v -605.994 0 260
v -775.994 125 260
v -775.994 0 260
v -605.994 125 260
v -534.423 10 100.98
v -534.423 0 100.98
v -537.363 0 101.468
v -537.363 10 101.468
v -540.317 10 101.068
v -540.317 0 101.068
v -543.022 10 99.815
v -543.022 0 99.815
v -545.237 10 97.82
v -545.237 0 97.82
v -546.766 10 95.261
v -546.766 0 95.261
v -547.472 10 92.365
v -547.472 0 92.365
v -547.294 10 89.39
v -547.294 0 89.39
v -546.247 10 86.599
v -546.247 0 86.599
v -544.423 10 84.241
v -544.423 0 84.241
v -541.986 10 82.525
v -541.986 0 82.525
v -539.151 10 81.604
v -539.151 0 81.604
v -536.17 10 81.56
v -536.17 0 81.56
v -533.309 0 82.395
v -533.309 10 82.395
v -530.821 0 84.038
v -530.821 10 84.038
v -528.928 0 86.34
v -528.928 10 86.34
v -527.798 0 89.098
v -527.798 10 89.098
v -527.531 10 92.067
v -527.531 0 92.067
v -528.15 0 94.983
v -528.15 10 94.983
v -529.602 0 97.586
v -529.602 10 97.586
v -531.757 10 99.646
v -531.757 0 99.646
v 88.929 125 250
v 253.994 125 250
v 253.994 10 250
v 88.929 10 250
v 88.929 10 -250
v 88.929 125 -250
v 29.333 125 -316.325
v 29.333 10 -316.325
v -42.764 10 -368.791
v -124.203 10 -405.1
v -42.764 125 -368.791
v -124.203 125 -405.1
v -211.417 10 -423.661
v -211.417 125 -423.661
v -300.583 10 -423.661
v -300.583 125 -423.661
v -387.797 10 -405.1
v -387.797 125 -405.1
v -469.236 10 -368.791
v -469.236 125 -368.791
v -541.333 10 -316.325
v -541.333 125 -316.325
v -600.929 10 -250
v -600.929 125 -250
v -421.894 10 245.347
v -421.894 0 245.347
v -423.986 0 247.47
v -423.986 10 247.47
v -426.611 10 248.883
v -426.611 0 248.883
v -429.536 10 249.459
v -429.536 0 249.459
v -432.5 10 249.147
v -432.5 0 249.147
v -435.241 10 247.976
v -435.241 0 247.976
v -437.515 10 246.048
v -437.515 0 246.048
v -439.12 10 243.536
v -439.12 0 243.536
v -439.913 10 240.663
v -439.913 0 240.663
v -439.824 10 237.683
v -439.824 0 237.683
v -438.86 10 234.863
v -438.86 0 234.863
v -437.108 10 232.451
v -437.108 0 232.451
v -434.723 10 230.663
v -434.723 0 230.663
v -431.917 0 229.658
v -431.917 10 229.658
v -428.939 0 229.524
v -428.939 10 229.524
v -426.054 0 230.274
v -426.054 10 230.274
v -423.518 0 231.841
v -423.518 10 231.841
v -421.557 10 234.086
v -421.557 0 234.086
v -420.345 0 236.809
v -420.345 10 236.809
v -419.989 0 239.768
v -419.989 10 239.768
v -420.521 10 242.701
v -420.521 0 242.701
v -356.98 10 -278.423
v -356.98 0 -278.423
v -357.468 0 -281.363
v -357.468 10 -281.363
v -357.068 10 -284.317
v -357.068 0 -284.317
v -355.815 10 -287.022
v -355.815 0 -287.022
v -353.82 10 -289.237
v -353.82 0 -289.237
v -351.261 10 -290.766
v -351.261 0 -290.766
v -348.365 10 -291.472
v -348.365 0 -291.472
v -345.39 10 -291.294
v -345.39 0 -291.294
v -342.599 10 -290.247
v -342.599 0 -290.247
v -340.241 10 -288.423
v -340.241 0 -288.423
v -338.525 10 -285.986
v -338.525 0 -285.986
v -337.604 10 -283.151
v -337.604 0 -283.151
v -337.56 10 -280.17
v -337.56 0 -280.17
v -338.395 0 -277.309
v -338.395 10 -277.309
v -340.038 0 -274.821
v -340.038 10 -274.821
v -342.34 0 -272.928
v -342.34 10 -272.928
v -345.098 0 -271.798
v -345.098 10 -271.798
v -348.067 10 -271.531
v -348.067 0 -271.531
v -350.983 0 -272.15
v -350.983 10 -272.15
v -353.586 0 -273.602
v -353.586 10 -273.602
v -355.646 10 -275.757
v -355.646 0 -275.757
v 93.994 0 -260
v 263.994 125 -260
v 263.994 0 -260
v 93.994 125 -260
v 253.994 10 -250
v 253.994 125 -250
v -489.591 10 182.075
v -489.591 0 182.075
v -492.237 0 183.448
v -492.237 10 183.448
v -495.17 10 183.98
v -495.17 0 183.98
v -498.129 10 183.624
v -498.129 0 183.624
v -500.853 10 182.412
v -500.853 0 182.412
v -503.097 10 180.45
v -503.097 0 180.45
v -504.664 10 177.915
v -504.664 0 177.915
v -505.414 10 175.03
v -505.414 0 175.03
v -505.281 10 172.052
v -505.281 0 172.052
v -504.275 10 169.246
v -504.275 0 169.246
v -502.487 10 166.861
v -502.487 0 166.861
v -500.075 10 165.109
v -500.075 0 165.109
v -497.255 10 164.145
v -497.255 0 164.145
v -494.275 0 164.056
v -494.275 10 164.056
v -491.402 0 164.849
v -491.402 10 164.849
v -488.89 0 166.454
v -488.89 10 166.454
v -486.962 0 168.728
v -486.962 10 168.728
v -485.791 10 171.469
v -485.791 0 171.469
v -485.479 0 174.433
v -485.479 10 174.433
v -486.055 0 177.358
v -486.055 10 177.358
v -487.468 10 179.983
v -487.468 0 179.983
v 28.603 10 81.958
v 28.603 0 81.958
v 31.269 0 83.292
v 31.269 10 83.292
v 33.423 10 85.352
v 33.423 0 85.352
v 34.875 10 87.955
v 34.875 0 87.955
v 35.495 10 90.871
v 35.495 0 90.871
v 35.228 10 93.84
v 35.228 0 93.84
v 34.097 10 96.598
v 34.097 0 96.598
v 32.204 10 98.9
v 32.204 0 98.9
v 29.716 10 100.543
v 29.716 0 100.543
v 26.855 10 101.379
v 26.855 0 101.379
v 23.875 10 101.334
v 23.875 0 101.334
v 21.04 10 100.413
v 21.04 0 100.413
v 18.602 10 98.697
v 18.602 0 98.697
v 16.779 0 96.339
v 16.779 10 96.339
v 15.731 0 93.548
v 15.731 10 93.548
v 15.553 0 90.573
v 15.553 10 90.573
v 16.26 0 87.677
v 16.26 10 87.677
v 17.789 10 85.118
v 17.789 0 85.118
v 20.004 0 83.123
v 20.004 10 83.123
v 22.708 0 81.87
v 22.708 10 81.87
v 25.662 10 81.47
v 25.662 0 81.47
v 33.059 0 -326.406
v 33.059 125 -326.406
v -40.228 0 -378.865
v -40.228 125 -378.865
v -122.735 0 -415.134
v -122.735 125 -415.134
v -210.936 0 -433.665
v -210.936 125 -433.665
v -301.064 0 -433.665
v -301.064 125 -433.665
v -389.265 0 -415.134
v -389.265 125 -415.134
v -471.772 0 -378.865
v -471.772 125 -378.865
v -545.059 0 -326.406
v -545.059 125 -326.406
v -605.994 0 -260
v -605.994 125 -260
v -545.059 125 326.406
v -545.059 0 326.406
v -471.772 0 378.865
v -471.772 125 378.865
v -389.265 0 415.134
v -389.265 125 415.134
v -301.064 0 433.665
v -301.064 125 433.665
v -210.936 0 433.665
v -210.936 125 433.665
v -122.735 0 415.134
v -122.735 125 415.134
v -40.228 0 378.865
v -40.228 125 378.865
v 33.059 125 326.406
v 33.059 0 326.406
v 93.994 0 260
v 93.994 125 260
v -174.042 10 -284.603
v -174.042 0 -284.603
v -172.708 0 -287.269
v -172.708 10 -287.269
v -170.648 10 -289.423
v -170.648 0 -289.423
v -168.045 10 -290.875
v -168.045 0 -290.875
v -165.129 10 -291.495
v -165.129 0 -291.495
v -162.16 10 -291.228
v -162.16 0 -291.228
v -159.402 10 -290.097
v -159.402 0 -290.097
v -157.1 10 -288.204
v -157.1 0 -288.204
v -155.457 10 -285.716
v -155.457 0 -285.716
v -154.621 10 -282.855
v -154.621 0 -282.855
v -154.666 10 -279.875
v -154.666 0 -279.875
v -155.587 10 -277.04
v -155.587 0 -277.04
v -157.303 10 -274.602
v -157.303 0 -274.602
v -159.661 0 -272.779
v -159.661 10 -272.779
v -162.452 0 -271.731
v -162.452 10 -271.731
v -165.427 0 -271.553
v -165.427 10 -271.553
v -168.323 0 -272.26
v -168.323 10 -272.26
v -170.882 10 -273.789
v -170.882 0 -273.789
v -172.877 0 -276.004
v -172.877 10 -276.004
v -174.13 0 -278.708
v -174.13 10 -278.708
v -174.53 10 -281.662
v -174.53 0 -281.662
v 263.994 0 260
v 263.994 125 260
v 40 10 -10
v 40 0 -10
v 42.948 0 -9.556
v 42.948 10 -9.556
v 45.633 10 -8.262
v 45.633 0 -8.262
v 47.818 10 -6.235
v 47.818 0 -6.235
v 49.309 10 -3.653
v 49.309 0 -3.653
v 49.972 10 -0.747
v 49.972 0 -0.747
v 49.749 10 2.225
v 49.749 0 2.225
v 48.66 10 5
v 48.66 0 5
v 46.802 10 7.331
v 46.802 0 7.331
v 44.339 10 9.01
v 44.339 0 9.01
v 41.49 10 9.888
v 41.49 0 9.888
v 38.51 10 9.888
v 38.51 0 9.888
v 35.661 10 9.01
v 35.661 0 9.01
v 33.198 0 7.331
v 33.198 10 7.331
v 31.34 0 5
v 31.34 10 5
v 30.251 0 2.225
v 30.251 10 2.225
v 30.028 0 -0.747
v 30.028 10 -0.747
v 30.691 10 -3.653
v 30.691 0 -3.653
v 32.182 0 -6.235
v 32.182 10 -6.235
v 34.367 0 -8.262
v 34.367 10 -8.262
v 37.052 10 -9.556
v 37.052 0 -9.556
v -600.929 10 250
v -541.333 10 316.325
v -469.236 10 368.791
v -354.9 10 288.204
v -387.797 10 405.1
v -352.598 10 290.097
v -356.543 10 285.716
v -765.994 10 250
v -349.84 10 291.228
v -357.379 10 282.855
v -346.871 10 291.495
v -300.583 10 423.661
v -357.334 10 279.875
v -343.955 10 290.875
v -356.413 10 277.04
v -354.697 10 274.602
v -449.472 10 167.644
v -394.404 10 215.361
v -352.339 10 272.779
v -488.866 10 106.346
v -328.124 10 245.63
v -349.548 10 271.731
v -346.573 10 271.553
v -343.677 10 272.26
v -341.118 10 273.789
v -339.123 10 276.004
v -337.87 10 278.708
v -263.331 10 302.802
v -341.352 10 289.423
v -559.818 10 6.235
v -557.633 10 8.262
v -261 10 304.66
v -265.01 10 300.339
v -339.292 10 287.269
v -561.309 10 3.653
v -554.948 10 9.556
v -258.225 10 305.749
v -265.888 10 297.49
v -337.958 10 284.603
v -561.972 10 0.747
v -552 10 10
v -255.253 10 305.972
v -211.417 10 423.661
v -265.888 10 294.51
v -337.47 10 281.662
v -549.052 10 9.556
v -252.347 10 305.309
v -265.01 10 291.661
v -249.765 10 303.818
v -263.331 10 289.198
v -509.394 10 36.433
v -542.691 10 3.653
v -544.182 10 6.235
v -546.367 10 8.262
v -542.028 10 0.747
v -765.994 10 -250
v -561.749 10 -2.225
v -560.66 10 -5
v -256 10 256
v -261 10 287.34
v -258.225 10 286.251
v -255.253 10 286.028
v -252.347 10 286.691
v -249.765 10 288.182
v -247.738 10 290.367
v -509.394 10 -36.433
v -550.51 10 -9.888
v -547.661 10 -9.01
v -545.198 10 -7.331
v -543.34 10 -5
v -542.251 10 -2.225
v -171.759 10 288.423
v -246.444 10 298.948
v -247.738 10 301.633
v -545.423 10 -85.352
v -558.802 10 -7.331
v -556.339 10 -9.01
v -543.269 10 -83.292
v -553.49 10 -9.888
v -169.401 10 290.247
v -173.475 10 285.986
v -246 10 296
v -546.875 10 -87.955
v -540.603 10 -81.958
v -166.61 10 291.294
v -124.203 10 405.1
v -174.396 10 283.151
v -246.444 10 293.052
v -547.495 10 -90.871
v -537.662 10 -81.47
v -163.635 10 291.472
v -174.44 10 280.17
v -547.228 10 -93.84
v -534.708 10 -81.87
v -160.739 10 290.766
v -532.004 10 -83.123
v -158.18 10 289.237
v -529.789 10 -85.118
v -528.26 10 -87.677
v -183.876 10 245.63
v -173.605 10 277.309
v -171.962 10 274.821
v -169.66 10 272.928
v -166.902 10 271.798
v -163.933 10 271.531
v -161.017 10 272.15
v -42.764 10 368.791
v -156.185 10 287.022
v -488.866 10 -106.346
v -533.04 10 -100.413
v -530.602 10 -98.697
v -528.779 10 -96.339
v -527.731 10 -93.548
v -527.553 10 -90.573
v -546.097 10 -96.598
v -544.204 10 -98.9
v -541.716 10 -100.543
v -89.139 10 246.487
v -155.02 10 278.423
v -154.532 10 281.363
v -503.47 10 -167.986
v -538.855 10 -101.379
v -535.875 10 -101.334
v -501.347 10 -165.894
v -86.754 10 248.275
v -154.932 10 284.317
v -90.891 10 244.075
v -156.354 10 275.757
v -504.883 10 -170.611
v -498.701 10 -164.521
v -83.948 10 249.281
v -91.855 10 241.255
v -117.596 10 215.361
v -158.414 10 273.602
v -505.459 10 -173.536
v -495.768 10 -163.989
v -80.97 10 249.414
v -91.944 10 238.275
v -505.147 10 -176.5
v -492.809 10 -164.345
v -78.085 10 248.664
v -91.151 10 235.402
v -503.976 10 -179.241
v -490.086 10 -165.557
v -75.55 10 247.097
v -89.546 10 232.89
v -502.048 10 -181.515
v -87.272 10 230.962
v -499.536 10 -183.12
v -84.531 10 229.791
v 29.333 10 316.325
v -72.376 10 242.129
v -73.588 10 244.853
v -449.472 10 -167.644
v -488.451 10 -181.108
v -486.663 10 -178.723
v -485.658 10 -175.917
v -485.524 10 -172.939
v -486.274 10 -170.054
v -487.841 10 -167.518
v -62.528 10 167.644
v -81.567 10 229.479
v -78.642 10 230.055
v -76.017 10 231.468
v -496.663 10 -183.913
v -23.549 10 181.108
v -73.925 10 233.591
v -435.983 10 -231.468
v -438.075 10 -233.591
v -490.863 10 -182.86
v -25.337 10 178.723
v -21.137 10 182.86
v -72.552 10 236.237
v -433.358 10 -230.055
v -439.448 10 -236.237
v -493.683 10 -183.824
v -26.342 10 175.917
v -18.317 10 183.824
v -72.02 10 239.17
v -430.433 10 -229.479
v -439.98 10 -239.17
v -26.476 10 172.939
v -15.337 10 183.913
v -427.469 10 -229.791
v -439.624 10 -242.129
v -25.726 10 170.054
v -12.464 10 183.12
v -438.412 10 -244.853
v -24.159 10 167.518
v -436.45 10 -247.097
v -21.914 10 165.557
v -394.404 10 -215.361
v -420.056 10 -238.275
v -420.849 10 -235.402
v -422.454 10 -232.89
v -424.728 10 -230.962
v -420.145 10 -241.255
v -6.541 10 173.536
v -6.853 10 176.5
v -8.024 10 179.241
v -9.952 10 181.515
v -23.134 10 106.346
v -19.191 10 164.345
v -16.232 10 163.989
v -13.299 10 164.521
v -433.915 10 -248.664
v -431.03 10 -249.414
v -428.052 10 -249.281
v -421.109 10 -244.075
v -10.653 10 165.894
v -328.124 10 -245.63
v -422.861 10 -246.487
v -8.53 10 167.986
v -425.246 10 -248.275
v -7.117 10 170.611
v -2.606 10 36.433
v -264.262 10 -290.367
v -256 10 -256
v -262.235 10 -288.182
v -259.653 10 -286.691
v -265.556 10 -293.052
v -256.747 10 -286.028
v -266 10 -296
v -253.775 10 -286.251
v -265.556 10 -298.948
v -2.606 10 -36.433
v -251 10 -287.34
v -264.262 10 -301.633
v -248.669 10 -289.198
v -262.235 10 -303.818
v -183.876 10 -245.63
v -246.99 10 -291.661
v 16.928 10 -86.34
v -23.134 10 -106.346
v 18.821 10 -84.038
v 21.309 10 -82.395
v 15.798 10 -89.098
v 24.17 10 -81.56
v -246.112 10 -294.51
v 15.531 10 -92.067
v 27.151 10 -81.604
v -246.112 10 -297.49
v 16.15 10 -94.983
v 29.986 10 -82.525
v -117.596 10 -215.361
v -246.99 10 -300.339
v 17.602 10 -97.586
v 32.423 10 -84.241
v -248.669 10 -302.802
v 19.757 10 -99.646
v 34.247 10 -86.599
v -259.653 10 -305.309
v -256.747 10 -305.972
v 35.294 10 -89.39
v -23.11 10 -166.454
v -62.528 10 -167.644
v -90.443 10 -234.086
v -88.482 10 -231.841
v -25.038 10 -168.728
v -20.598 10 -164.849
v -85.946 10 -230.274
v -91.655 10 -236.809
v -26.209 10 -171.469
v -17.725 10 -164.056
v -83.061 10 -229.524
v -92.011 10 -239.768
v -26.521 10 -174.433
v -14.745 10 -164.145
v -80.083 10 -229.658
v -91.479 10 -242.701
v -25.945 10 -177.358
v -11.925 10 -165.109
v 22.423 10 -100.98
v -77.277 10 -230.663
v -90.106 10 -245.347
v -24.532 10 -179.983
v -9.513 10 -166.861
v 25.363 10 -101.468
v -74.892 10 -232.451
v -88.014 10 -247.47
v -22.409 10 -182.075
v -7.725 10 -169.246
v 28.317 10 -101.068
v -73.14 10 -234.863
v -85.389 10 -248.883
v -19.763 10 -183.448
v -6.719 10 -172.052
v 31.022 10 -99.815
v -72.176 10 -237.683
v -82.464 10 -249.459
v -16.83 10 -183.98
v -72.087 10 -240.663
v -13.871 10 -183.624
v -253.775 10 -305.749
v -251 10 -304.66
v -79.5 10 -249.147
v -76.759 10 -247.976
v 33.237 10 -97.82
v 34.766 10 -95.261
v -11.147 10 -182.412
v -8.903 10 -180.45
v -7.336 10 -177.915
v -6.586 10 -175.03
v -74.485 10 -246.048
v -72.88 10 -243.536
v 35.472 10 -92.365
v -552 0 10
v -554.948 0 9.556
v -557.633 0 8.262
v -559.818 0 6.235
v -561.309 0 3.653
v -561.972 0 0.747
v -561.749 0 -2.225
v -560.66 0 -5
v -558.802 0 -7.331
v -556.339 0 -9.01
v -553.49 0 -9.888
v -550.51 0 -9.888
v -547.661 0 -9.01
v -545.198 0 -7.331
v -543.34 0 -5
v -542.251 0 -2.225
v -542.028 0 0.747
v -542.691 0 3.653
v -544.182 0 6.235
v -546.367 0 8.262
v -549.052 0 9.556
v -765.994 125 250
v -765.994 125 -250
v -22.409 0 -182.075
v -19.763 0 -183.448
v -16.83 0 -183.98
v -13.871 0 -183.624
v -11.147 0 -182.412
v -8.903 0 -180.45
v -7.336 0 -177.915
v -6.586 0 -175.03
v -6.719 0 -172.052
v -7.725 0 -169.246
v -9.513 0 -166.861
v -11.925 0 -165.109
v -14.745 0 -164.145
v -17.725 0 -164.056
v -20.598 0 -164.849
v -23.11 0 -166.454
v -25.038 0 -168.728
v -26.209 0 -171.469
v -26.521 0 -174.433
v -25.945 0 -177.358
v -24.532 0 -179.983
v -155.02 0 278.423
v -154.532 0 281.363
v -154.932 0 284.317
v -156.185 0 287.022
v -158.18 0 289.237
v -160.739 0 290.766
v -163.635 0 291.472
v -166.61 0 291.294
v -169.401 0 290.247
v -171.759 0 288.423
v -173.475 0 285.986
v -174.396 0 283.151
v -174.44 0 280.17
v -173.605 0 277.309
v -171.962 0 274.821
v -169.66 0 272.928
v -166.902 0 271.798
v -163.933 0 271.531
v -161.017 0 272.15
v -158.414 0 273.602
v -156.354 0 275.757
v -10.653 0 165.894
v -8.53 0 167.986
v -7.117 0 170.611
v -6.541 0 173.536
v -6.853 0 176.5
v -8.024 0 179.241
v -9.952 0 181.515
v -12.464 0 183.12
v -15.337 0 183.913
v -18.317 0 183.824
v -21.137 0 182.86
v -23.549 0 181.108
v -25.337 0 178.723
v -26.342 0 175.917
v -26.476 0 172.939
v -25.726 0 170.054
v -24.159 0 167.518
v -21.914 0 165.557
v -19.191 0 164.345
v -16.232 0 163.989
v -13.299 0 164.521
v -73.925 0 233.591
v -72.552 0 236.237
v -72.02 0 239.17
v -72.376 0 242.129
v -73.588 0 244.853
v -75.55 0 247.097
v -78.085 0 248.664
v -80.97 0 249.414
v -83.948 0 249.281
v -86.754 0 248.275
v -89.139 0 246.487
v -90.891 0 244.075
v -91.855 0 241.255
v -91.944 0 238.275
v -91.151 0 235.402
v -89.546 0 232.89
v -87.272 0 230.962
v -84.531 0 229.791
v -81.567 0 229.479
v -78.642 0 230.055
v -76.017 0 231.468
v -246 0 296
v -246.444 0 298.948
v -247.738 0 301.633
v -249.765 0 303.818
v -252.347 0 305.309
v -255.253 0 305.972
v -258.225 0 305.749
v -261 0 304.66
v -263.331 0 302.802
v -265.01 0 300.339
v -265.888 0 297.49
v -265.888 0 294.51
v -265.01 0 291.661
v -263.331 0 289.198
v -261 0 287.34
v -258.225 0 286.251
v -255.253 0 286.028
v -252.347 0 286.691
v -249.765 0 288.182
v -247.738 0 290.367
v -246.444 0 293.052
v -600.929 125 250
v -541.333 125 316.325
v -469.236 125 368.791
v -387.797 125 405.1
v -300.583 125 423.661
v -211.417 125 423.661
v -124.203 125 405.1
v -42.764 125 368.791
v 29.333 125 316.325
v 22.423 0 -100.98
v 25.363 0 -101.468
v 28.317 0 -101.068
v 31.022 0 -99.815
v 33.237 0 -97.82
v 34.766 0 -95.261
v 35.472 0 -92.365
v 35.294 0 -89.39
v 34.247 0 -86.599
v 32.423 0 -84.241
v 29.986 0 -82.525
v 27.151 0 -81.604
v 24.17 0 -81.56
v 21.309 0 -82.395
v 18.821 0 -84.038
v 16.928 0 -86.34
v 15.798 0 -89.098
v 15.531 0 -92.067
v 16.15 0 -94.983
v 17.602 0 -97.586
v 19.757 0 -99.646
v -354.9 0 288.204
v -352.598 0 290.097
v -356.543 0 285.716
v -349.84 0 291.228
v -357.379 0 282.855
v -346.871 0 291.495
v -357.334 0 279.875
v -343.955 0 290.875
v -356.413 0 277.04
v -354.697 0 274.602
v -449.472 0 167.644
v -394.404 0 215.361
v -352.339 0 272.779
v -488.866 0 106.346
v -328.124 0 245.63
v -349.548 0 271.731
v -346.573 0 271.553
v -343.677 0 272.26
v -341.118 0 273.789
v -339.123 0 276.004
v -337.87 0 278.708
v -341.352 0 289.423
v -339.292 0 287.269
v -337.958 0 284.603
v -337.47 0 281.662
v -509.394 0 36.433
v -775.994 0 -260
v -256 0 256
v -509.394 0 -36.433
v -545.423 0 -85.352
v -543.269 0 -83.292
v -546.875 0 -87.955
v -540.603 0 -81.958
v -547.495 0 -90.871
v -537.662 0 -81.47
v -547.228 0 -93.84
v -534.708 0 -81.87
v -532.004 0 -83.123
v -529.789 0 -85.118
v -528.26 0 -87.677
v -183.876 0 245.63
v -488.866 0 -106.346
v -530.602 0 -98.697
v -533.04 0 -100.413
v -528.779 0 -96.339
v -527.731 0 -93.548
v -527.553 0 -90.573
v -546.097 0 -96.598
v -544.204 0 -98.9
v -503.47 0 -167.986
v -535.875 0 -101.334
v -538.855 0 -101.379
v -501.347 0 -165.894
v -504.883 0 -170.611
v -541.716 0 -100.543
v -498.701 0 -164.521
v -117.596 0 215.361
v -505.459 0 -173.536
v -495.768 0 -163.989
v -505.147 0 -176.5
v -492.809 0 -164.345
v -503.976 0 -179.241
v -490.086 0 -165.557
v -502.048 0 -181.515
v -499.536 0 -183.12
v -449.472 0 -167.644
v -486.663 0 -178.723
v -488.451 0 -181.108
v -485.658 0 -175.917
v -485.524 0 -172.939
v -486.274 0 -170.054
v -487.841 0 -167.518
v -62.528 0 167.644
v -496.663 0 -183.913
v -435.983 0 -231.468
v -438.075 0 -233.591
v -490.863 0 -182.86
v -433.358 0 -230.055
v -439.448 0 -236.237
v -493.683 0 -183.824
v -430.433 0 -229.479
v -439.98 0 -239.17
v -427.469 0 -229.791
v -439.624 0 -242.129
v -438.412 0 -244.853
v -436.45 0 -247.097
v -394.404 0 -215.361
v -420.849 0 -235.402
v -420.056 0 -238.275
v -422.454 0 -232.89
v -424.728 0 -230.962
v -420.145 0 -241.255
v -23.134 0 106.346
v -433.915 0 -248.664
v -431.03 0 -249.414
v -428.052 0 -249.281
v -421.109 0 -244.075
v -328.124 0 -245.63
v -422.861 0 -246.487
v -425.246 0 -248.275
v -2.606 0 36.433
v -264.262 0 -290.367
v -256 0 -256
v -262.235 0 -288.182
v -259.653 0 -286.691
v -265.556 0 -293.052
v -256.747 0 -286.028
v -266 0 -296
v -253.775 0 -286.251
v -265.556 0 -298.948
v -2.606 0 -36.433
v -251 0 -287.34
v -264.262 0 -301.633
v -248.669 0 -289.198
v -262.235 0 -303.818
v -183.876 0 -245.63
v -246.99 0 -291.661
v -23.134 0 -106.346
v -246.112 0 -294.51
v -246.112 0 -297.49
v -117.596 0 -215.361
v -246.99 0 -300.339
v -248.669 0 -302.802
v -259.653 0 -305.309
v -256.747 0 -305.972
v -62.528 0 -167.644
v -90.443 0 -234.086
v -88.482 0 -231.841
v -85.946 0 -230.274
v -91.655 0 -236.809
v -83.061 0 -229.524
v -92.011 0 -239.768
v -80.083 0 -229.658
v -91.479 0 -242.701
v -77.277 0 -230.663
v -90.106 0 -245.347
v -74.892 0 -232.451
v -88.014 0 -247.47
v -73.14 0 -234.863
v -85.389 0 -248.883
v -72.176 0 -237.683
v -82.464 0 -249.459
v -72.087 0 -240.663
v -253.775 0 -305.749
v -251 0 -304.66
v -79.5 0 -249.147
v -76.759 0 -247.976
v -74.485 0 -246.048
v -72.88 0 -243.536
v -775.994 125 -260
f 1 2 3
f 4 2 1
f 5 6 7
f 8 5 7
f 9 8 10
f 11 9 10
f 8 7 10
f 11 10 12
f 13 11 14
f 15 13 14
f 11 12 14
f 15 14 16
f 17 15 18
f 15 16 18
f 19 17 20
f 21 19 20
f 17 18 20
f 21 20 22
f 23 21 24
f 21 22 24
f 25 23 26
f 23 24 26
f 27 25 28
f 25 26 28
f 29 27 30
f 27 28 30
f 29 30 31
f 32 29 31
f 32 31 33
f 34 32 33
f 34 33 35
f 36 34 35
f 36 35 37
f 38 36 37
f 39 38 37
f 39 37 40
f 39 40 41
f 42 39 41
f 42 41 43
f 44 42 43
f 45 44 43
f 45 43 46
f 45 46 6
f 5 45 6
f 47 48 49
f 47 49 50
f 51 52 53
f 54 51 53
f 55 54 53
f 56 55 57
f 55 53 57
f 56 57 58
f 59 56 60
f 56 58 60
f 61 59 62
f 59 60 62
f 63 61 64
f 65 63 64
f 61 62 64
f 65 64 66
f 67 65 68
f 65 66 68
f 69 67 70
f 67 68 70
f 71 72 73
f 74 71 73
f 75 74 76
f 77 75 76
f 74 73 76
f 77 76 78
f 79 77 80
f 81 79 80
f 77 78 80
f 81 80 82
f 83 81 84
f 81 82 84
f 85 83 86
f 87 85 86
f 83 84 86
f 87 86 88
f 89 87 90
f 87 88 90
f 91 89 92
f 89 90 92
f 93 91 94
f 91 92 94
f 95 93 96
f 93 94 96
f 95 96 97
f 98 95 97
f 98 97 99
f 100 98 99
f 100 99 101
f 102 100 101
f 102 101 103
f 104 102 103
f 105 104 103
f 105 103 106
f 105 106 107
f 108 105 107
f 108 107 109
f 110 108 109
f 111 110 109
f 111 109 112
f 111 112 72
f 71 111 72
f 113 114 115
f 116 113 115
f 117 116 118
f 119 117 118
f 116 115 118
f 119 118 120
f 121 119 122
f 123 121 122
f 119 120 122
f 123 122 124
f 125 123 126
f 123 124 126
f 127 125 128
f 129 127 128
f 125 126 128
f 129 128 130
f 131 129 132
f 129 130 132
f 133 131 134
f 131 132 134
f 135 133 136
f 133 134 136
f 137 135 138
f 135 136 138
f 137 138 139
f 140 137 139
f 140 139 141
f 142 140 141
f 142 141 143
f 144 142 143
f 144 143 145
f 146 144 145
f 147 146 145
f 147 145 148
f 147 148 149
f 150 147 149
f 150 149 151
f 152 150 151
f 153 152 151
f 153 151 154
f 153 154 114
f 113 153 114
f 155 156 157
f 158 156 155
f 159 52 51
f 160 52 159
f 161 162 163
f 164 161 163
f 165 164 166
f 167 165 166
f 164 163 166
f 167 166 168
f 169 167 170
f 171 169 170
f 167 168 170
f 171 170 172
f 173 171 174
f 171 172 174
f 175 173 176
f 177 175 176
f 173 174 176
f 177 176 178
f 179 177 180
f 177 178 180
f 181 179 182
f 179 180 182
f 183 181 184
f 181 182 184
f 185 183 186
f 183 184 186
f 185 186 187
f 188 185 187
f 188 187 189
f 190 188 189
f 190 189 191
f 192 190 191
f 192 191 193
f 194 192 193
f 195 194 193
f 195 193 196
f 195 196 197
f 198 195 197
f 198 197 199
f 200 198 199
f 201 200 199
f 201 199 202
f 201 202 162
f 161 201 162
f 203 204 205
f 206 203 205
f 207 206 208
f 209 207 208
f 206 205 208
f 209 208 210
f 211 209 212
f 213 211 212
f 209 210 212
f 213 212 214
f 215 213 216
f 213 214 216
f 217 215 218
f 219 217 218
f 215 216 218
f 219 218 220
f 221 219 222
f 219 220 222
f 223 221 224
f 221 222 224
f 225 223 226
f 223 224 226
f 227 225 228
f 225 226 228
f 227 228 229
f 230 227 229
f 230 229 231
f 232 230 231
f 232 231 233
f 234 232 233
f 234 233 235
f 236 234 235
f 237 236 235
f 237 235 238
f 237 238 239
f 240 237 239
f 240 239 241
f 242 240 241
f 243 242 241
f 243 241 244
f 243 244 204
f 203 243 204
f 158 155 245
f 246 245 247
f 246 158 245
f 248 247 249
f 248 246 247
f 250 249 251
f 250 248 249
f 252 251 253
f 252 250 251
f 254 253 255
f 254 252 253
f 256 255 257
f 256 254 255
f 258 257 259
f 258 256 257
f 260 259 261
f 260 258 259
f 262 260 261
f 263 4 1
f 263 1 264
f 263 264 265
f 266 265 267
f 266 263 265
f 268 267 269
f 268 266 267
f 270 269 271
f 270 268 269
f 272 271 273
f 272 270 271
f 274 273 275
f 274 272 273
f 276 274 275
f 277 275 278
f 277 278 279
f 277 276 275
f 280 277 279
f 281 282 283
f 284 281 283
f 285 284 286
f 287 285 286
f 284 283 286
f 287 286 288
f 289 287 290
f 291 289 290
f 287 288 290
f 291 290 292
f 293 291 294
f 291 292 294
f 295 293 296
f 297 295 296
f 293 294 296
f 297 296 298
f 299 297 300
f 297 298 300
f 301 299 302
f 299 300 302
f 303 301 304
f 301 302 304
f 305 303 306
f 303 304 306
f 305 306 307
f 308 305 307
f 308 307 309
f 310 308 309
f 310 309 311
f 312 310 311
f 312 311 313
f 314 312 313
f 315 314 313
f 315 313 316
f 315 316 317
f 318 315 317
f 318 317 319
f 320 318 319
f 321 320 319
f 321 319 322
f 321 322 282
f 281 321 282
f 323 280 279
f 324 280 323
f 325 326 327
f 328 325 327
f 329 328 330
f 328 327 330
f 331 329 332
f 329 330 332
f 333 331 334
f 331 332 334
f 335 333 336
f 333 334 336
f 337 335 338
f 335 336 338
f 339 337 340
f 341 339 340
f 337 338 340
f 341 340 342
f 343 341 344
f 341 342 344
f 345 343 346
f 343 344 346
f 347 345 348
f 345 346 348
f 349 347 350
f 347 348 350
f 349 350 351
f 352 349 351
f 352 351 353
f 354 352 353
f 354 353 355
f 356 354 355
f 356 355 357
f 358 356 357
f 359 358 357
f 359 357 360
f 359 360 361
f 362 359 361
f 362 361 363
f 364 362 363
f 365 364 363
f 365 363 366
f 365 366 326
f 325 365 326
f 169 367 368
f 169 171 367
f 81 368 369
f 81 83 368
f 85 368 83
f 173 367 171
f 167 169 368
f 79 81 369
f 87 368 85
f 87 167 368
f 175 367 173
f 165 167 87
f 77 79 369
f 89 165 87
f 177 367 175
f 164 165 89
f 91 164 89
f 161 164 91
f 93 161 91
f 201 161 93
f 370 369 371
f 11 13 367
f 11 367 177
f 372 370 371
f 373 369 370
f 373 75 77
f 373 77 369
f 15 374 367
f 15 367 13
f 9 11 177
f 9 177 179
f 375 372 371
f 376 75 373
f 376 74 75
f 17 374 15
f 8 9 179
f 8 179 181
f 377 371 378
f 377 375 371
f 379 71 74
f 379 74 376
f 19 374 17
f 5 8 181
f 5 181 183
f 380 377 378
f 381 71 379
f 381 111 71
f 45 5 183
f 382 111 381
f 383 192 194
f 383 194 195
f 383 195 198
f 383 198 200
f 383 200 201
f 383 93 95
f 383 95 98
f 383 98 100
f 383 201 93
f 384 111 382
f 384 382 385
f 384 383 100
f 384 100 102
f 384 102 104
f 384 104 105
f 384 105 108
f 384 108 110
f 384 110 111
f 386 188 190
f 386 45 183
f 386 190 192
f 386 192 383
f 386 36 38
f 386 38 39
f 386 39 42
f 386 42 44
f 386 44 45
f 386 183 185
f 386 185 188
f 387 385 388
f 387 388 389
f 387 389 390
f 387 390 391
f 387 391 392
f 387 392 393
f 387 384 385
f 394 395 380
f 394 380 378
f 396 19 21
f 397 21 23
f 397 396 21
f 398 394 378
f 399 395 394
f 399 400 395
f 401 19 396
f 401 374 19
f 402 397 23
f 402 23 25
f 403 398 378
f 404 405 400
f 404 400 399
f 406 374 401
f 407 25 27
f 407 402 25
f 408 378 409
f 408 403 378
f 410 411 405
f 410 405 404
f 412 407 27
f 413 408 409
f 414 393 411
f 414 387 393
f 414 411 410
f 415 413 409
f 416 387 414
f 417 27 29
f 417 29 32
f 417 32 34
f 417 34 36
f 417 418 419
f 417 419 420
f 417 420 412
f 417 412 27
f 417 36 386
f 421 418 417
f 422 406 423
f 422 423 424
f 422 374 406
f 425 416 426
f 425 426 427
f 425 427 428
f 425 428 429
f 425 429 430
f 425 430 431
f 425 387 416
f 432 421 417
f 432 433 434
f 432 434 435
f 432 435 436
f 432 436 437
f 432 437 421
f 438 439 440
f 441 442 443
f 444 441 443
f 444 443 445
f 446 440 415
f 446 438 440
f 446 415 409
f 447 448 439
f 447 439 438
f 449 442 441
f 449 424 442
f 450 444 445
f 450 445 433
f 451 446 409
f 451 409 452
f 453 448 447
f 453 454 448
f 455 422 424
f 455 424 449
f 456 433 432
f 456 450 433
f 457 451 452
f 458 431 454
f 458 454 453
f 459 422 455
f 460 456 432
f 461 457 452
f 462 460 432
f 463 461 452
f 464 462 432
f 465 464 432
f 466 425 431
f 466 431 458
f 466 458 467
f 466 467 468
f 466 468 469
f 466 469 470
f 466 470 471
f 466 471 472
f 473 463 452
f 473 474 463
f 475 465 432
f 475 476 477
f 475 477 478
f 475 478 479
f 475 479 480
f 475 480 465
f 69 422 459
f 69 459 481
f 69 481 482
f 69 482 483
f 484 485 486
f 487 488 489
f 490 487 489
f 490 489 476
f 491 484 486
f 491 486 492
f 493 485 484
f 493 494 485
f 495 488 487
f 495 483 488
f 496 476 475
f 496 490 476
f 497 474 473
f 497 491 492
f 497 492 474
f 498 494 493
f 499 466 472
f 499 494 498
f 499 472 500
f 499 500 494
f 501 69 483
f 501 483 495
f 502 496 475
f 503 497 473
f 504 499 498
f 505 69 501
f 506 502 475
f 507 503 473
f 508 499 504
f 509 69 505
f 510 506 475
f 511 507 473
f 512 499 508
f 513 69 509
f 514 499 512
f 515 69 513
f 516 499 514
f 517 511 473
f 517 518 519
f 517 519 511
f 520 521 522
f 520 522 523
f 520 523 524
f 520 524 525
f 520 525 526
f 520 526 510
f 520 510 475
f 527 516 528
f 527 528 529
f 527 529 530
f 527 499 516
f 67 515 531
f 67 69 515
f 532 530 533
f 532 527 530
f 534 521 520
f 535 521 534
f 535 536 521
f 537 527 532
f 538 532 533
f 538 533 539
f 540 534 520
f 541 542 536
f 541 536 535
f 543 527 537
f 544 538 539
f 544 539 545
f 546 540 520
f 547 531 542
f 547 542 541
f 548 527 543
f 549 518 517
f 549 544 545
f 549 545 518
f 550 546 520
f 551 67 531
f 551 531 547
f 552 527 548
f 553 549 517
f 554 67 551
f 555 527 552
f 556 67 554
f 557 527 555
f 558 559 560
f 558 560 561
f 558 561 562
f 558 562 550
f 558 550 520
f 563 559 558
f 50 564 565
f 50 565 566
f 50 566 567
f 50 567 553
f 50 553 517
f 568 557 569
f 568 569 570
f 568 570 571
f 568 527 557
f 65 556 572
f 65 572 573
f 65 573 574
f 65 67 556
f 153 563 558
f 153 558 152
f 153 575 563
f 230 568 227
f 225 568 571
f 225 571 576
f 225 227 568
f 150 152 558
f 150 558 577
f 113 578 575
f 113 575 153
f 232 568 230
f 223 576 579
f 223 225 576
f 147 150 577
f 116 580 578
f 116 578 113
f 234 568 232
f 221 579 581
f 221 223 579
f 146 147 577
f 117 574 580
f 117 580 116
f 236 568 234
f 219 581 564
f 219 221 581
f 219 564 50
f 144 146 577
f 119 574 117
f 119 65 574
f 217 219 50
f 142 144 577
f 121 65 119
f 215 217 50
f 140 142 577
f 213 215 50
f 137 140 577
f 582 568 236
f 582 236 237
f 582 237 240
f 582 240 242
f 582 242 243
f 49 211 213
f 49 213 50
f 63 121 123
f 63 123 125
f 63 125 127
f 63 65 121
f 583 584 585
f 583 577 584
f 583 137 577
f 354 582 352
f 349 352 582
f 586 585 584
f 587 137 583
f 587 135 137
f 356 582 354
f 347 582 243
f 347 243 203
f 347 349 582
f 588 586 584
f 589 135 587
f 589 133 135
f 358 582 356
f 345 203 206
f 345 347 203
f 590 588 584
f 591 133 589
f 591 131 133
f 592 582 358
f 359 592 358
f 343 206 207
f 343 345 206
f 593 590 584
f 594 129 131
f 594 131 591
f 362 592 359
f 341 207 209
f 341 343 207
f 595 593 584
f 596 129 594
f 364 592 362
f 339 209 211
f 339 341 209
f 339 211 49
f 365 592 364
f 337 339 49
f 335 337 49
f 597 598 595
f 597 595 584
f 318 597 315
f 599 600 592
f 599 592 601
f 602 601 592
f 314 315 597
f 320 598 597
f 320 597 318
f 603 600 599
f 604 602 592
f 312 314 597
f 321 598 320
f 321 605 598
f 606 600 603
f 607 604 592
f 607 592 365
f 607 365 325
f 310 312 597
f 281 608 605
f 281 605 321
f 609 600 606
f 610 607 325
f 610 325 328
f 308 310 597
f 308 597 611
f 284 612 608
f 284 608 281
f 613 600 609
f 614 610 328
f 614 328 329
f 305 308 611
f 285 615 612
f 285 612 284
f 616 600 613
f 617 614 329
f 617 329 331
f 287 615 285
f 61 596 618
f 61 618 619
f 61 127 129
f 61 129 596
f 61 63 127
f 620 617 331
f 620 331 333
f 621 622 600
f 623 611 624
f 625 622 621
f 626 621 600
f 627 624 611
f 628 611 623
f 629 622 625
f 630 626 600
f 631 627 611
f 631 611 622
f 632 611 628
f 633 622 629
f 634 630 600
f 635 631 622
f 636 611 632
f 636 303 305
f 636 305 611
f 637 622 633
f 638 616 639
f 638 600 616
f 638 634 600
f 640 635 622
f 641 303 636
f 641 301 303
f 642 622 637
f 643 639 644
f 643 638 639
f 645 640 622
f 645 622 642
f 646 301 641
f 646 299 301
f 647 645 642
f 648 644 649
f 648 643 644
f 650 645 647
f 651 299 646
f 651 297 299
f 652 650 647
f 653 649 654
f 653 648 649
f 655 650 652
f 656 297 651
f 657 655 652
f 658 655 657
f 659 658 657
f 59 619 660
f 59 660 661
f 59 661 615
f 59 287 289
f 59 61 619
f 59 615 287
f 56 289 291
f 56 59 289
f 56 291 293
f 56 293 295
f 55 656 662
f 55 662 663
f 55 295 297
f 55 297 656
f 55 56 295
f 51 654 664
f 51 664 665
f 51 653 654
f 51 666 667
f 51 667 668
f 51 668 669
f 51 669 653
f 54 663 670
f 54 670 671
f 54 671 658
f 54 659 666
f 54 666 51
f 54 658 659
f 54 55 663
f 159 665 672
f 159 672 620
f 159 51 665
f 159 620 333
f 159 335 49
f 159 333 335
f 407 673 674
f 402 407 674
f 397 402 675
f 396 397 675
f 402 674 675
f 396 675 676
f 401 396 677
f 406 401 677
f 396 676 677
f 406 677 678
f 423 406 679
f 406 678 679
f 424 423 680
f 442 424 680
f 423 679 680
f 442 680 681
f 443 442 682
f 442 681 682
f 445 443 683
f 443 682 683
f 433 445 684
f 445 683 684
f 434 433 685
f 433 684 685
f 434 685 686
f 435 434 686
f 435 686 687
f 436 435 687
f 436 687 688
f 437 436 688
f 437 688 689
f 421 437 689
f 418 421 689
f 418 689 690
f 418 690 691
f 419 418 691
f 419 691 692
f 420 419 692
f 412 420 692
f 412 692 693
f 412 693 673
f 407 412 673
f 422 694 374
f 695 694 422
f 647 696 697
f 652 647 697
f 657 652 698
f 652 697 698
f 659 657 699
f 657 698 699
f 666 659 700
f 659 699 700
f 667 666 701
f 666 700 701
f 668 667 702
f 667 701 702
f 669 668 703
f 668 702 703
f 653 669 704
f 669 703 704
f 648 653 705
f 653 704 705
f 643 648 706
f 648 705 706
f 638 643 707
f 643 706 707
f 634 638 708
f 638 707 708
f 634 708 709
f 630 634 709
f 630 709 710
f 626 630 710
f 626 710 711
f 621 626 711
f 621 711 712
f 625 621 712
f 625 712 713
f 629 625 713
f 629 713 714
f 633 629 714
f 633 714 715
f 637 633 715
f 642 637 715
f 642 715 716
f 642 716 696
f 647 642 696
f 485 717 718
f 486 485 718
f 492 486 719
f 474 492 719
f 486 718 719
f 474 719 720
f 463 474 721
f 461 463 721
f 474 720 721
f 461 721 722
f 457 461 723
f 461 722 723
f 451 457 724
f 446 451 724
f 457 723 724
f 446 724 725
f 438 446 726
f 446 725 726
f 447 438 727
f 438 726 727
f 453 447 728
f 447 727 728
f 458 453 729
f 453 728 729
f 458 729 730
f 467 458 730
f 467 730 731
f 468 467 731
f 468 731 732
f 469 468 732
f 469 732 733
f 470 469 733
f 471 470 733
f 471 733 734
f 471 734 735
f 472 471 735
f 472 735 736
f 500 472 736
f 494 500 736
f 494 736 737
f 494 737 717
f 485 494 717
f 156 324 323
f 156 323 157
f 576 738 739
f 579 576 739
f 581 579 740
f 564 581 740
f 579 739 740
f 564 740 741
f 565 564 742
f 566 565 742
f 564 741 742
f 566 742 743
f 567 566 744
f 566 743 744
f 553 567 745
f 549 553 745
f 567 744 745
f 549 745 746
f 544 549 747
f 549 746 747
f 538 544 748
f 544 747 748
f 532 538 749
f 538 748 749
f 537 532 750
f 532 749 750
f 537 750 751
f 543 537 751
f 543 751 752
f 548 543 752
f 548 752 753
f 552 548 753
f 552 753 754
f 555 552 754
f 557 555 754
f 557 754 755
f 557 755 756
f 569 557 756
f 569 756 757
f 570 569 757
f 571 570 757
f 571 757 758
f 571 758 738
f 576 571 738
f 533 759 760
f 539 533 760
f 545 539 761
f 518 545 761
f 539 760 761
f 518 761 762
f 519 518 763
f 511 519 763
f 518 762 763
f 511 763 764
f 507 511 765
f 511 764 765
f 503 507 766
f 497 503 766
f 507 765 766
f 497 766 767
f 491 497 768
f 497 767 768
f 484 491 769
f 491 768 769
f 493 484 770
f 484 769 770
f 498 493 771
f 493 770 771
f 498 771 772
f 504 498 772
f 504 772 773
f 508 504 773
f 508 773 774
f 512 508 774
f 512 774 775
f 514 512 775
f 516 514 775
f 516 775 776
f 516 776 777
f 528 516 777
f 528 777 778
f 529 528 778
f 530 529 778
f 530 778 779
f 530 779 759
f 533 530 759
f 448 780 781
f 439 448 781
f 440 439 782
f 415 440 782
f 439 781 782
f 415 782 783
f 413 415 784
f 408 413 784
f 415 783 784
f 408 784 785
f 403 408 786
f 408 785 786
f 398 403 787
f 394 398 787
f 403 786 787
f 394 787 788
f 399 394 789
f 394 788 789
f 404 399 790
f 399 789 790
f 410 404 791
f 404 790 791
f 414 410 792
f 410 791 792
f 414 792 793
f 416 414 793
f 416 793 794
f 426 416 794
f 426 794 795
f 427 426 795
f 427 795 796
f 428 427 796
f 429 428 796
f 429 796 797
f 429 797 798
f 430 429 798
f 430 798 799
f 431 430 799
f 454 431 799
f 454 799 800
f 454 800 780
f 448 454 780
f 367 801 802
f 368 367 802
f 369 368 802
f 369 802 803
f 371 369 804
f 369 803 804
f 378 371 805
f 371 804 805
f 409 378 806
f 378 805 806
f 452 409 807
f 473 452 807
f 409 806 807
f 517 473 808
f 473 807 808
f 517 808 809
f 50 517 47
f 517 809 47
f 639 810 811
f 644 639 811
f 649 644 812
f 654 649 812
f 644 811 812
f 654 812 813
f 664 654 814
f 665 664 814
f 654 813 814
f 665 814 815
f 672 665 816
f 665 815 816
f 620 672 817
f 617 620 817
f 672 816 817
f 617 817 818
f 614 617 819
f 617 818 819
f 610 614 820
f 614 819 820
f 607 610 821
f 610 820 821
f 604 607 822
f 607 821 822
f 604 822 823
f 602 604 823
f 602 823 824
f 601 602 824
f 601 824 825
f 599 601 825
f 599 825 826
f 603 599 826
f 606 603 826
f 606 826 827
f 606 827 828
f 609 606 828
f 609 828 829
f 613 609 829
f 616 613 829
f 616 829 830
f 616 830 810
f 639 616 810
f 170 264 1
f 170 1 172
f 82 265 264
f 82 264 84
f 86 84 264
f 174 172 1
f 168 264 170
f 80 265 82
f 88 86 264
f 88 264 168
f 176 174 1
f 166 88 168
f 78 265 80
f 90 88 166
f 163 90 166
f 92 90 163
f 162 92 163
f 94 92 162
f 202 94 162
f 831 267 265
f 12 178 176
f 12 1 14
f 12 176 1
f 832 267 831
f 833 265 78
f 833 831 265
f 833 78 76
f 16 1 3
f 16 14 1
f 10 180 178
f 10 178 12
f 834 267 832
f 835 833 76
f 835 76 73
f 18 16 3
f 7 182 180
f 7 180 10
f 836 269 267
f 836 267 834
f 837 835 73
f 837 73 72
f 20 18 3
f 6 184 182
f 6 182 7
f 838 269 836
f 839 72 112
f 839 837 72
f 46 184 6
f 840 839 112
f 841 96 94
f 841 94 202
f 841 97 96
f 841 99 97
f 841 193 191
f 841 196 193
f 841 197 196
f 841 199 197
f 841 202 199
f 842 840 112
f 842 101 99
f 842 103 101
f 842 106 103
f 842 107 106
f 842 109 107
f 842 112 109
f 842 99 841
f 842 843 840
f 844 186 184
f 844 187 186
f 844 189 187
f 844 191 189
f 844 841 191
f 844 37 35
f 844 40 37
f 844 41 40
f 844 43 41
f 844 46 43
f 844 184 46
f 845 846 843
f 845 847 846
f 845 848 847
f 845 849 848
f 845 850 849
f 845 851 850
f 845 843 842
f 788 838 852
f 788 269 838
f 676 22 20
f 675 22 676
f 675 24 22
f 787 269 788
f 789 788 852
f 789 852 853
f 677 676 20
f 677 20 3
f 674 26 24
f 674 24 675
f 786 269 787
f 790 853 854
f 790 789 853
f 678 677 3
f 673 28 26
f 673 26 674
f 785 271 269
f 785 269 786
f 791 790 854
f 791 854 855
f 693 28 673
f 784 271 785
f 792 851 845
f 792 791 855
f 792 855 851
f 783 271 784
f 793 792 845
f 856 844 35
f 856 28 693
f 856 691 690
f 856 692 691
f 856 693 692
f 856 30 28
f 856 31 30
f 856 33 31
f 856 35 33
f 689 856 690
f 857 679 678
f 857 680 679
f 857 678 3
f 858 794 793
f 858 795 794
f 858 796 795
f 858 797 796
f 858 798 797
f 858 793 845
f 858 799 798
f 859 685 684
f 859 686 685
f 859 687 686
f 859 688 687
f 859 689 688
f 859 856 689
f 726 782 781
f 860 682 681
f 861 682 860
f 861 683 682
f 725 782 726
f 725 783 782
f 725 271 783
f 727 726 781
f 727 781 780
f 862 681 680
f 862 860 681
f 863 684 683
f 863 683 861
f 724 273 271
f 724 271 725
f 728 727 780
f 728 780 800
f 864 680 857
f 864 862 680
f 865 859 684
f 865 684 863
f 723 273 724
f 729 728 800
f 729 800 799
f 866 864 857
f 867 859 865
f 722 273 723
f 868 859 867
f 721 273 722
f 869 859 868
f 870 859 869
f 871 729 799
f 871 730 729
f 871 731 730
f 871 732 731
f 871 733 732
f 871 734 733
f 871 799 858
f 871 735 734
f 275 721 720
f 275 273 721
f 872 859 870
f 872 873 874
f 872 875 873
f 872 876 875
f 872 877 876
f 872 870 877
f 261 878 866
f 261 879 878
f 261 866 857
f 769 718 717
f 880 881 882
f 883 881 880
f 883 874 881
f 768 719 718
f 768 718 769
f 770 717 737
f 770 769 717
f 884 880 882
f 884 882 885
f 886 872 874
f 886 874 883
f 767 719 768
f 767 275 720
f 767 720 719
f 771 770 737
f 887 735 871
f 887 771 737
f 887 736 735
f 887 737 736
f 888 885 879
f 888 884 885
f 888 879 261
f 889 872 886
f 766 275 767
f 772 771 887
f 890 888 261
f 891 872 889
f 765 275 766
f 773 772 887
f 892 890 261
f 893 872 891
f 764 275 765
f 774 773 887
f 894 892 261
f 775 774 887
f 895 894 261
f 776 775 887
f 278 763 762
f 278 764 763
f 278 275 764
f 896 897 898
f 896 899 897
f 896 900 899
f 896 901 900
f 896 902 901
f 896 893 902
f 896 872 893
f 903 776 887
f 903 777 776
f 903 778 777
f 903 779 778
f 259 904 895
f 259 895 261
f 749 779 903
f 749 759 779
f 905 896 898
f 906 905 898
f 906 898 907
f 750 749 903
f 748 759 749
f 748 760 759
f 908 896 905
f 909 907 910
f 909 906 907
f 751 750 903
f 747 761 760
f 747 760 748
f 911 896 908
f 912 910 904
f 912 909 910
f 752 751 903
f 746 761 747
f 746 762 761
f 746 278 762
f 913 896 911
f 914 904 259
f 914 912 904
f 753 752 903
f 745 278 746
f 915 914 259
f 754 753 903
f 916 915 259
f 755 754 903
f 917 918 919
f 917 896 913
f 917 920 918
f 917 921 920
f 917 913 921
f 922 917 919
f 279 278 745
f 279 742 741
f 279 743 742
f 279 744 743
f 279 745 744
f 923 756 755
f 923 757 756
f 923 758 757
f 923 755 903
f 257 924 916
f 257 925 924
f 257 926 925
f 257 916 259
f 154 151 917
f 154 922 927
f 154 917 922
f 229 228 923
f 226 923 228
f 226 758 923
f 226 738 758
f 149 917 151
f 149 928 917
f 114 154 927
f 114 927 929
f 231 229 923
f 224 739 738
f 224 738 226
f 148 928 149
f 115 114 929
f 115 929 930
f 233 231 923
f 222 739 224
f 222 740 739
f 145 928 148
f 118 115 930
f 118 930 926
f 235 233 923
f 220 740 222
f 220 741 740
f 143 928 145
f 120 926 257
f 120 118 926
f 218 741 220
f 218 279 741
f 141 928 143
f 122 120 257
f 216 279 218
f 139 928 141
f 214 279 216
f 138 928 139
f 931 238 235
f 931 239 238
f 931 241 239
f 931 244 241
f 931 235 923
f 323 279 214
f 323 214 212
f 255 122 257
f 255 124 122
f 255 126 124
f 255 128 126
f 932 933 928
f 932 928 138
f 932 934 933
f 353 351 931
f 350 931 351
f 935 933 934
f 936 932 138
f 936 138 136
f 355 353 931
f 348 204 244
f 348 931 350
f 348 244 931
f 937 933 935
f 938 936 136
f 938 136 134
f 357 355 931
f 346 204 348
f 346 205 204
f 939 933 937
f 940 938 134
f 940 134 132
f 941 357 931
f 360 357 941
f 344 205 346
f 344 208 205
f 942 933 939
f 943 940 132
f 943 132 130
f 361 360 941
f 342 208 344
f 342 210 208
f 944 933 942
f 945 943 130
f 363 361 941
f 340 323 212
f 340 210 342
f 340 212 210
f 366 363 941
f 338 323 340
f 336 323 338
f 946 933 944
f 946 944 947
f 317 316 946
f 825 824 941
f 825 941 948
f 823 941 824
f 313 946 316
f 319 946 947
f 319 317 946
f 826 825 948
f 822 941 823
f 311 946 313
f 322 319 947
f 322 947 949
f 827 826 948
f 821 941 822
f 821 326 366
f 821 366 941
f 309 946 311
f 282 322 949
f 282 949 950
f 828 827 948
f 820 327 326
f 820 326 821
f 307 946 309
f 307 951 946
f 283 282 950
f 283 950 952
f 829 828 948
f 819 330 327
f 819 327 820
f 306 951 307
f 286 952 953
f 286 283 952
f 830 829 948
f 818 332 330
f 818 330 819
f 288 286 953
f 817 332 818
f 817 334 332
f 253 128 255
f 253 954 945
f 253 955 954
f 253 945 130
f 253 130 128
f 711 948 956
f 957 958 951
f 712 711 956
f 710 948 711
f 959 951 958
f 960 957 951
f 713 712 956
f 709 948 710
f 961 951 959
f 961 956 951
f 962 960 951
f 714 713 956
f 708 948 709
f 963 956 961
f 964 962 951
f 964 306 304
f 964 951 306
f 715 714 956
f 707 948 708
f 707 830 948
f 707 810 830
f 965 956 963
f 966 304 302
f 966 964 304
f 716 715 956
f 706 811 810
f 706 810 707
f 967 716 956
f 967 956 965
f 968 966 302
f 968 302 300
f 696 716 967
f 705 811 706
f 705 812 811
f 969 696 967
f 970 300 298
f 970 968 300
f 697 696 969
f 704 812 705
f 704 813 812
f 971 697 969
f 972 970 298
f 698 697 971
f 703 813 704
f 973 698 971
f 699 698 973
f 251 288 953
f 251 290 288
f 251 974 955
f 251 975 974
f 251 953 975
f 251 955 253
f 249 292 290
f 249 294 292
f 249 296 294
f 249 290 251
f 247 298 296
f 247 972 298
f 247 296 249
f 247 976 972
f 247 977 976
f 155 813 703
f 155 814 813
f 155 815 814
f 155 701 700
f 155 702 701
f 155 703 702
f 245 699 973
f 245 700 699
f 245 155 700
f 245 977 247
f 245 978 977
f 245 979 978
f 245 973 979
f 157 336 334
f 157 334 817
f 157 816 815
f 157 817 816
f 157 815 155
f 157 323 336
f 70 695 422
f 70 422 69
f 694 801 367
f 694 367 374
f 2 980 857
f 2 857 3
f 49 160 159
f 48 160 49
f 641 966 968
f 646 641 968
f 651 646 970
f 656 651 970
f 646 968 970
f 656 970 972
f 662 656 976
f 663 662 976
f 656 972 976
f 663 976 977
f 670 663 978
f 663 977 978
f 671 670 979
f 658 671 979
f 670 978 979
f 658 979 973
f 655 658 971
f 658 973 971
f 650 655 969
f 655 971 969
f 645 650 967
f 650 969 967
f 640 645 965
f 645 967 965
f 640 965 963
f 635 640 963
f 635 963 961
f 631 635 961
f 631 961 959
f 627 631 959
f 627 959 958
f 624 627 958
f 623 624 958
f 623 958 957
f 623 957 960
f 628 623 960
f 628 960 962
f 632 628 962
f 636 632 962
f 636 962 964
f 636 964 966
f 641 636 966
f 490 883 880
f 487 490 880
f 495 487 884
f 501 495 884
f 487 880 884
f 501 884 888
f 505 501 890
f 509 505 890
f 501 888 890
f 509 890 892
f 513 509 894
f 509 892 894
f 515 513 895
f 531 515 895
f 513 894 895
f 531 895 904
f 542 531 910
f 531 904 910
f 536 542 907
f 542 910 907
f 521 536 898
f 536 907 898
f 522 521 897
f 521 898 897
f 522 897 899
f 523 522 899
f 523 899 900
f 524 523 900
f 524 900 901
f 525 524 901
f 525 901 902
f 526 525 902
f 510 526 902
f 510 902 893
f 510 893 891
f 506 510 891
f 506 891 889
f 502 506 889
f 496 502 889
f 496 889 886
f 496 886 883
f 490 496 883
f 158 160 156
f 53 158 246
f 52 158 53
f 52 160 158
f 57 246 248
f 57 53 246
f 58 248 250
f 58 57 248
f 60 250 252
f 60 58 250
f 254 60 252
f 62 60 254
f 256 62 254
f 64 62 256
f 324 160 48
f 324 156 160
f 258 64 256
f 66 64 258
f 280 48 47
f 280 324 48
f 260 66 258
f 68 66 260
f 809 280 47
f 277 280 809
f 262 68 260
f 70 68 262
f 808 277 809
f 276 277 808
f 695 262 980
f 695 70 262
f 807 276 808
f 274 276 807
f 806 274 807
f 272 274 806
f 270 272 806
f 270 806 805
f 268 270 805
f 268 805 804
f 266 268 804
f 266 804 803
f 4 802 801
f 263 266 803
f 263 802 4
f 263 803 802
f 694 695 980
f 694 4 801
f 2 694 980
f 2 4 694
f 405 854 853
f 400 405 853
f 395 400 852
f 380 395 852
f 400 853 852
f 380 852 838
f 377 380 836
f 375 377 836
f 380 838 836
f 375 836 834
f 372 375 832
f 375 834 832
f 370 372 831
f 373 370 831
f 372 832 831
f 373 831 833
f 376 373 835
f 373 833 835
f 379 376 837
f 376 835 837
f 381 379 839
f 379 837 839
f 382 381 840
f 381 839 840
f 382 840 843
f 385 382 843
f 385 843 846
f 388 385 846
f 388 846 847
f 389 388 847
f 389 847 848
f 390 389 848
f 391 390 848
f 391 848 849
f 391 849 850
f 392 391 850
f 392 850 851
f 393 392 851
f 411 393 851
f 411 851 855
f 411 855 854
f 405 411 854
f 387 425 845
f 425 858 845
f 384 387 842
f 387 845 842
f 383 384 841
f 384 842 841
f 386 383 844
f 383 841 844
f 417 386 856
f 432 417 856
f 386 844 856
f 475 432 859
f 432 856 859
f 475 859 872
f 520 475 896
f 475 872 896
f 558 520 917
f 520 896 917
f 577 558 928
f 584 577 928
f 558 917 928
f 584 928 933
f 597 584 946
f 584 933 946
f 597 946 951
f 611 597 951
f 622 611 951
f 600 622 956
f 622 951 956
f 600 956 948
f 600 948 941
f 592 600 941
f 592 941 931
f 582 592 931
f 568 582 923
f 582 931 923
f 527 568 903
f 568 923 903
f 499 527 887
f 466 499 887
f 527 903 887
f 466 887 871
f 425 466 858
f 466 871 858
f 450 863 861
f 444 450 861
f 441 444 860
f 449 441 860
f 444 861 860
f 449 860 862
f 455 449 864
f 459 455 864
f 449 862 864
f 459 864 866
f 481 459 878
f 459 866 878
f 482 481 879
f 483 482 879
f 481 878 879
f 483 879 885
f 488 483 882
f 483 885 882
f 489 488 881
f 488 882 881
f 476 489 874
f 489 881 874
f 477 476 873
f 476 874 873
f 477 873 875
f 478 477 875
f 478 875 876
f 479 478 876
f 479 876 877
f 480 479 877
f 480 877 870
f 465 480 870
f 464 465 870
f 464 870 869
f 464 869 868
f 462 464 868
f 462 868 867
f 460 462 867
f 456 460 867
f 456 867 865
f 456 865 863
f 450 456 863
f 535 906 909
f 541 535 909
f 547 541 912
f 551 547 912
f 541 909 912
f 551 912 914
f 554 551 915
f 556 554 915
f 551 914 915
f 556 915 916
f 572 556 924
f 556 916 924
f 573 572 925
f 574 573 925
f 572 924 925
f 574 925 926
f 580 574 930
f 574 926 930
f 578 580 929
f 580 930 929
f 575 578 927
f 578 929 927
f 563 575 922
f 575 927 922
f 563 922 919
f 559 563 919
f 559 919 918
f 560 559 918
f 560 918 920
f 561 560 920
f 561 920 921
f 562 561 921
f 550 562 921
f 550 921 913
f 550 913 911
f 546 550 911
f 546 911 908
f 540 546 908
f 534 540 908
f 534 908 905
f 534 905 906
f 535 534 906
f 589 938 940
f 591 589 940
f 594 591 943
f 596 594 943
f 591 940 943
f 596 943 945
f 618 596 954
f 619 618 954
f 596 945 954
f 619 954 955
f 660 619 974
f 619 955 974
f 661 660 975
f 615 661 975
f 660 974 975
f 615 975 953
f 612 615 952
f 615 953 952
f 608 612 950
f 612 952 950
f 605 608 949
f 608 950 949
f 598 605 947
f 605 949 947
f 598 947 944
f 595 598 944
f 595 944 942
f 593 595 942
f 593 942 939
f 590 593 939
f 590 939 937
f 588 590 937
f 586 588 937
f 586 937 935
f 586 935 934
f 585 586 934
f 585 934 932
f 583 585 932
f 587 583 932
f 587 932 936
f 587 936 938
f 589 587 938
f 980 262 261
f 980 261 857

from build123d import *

# Parameters (mm, degrees)
ESQUISSE2_R                  = 10
ENL_V_MAT_EXTRU_1_DEPTH      = 687.62944883
R_P_TITION_CIRCULAIRE1_COUNT = 20
BOSS_EXTRU_1_START           = -10
ESQUISSE5_R                  = 436
ESQUISSE5_R_2                = 336
BOSS_EXTRU_1_DEPTH           = 10
BOSS_EXTRU_2_START           = 115
ESQUISSE6_R                  = 436
ESQUISSE6_R_2                = 426
BOSS_EXTRU_2_DEPTH           = 115
BOSS_EXTRU_3_START           = -10
BOSS_EXTRU_3_DEPTH           = 10
BOSS_EXTRU_4_START           = 115
BOSS_EXTRU_4_DEPTH           = 115
ENL_V_MAT_EXTRU_3_DEPTH      = 115
R_P_TITION_CIRCULAIRE6_COUNT = 2
ESQUISSE10_R                 = 336
ENL_V_MAT_EXTRU_4_DEPTH      = 80


with BuildPart() as part:
    # Esquisse1 → Révolution1 (revolve)
    with BuildSketch(Plane.XY, mode=Mode.PRIVATE) as r_volution1_sk:
        with BuildLine():
            Line((0, 0), (80, 0))
            Line((80, 0), (80, 52.5))
            ThreePointArc((80, 52.5), (70, 62.5), (80, 72.5))
            Line((80, 72.5), (80, 90))
            Line((80, 90), (0, 90))
            Line((0, 90), (0, 0))
        make_face()
    revolve(r_volution1_sk.sketch.rotate(Axis((-256, 27.419354839, 0), (0, -1, 0)), 90), axis=Axis((-256, 27.419354839, 0), (0, -1, 0)))

    # Esquisse2 → Enlèv. mat.-Extru.1 (cut, through all)
    with BuildSketch(Plane.XZ):
        with Locations(Location((40, 0, 0), (0, 0, 270))):
            Circle(ESQUISSE2_R)
    enl_v_mat_extru_1 = extrude(amount=-ENL_V_MAT_EXTRU_1_DEPTH, mode=Mode.SUBTRACT)

    # Répétition circulaire1: Enlèv. mat.-Extru.1 ×20 about axis
    r_p_tition_circulaire1_axis = Axis((-256, 0, 0), (0, 1, 0))
    for i in range(1, R_P_TITION_CIRCULAIRE1_COUNT):
        add(enl_v_mat_extru_1.rotate(r_p_tition_circulaire1_axis, i * 360 / R_P_TITION_CIRCULAIRE1_COUNT), mode=Mode.SUBTRACT)

    # Esquisse5 → Boss.-Extru.1 (add)
    with BuildSketch(Plane.XZ.offset(BOSS_EXTRU_1_START)):
        with Locations(Location((-256, 0, 0), (0, 0, 270))):
            Circle(ESQUISSE5_R)
        with Locations(Location((-256, 0, 0), (0, 0, 90))):
            Circle(ESQUISSE5_R_2, mode=Mode.SUBTRACT)
    extrude(amount=BOSS_EXTRU_1_DEPTH)

    # Esquisse6 → Boss.-Extru.2 (add)
    with BuildSketch(Plane(origin=(0, 10, 0), x_dir=(1, 0, 0), z_dir=(0, 1, 0)).offset(BOSS_EXTRU_2_START)):
        with Locations(Location((-256, 0, 0), (0, 0, 90))):
            Circle(ESQUISSE6_R)
        with Locations(Location((-256, 0, 0), (0, 0, 270))):
            Circle(ESQUISSE6_R_2, mode=Mode.SUBTRACT)
    extrude(amount=-BOSS_EXTRU_2_DEPTH)

    # Esquisse7 → Boss.-Extru.3 (add)
    with BuildSketch(Plane.XZ.offset(BOSS_EXTRU_3_START)):
        with BuildLine():
            Line((93.994285668, 260), (263.994285668, 260))
            Line((263.994285668, 260), (263.994285668, -260))
            Line((263.994285668, -260), (93.994285668, -260))
            ThreePointArc((93.994285668, -260), (180, 0), (93.994285668, 260))
        make_face()
    boss_extru_3 = extrude(amount=BOSS_EXTRU_3_DEPTH)

    # Esquisse8 → Boss.-Extru.4 (add)
    with BuildSketch(Plane(origin=(0, 10, 0), x_dir=(1, 0, 0), z_dir=(0, 1, 0)).offset(BOSS_EXTRU_4_START)):
        with BuildLine():
            Line((113.345366832, 250), (253.994285668, 250))
            Line((253.994285668, 250), (253.994285668, -250))
            Line((253.994285668, -250), (113.345366832, -250))
            Line((113.345366832, -250), (101.205823021, -250))
            ThreePointArc((101.205823021, -250), (97.635403251, -255.025491996), (93.994285668, -260))
            Line((93.994285668, -260), (263.994285668, -260))
            Line((263.994285668, -260), (263.994285668, 260))
            Line((263.994285668, 260), (93.994285668, 260))
            ThreePointArc((93.994285668, 260), (97.635403251, 255.025491996), (101.205823021, 250))
            Line((101.205823021, 250), (113.345366832, 250))
        make_face()
    boss_extru_4 = extrude(amount=-BOSS_EXTRU_4_DEPTH)

    # Esquisse9 → Enlèv. mat.-Extru.3 (cut)
    with BuildSketch(Plane(origin=(0, 125, 0), x_dir=(1, 0, 0), z_dir=(0, 1, 0))):
        with BuildLine():
            Line((101.205823021, -250), (88.928978197, -250))
            ThreePointArc((88.928978197, -250), (170, 0), (88.928978197, 250))
            Line((88.928978197, 250), (101.205823021, 250))
            ThreePointArc((101.205823021, 250), (180, 0), (101.205823021, -250))
        make_face()
    enl_v_mat_extru_3 = extrude(amount=-ENL_V_MAT_EXTRU_3_DEPTH, mode=Mode.SUBTRACT)

    # Répétition circulaire6: Boss.-Extru.3, Boss.-Extru.4, Enlèv. mat.-Extru.3 ×2 about axis
    r_p_tition_circulaire6_axis = Axis((-256, 0, 0), (0, 1, 0))
    add([boss_extru_3.rotate(r_p_tition_circulaire6_axis, i * 360 / R_P_TITION_CIRCULAIRE6_COUNT) for i in range(1, R_P_TITION_CIRCULAIRE6_COUNT)])
    add([boss_extru_4.rotate(r_p_tition_circulaire6_axis, i * 360 / R_P_TITION_CIRCULAIRE6_COUNT) for i in range(1, R_P_TITION_CIRCULAIRE6_COUNT)])
    add([enl_v_mat_extru_3.rotate(r_p_tition_circulaire6_axis, i * 360 / R_P_TITION_CIRCULAIRE6_COUNT) for i in range(1, R_P_TITION_CIRCULAIRE6_COUNT)], mode=Mode.SUBTRACT)

    # Esquisse10 → Enlèv. mat.-Extru.4 (cut)
    with BuildSketch(Plane(origin=(0, 90, 0), x_dir=(1, 0, 0), z_dir=(0, 1, 0))):
        with Locations((-256, 0)):
            Circle(ESQUISSE10_R)
    extrude(amount=-ENL_V_MAT_EXTRU_4_DEPTH, mode=Mode.SUBTRACT)


solid = part.part
